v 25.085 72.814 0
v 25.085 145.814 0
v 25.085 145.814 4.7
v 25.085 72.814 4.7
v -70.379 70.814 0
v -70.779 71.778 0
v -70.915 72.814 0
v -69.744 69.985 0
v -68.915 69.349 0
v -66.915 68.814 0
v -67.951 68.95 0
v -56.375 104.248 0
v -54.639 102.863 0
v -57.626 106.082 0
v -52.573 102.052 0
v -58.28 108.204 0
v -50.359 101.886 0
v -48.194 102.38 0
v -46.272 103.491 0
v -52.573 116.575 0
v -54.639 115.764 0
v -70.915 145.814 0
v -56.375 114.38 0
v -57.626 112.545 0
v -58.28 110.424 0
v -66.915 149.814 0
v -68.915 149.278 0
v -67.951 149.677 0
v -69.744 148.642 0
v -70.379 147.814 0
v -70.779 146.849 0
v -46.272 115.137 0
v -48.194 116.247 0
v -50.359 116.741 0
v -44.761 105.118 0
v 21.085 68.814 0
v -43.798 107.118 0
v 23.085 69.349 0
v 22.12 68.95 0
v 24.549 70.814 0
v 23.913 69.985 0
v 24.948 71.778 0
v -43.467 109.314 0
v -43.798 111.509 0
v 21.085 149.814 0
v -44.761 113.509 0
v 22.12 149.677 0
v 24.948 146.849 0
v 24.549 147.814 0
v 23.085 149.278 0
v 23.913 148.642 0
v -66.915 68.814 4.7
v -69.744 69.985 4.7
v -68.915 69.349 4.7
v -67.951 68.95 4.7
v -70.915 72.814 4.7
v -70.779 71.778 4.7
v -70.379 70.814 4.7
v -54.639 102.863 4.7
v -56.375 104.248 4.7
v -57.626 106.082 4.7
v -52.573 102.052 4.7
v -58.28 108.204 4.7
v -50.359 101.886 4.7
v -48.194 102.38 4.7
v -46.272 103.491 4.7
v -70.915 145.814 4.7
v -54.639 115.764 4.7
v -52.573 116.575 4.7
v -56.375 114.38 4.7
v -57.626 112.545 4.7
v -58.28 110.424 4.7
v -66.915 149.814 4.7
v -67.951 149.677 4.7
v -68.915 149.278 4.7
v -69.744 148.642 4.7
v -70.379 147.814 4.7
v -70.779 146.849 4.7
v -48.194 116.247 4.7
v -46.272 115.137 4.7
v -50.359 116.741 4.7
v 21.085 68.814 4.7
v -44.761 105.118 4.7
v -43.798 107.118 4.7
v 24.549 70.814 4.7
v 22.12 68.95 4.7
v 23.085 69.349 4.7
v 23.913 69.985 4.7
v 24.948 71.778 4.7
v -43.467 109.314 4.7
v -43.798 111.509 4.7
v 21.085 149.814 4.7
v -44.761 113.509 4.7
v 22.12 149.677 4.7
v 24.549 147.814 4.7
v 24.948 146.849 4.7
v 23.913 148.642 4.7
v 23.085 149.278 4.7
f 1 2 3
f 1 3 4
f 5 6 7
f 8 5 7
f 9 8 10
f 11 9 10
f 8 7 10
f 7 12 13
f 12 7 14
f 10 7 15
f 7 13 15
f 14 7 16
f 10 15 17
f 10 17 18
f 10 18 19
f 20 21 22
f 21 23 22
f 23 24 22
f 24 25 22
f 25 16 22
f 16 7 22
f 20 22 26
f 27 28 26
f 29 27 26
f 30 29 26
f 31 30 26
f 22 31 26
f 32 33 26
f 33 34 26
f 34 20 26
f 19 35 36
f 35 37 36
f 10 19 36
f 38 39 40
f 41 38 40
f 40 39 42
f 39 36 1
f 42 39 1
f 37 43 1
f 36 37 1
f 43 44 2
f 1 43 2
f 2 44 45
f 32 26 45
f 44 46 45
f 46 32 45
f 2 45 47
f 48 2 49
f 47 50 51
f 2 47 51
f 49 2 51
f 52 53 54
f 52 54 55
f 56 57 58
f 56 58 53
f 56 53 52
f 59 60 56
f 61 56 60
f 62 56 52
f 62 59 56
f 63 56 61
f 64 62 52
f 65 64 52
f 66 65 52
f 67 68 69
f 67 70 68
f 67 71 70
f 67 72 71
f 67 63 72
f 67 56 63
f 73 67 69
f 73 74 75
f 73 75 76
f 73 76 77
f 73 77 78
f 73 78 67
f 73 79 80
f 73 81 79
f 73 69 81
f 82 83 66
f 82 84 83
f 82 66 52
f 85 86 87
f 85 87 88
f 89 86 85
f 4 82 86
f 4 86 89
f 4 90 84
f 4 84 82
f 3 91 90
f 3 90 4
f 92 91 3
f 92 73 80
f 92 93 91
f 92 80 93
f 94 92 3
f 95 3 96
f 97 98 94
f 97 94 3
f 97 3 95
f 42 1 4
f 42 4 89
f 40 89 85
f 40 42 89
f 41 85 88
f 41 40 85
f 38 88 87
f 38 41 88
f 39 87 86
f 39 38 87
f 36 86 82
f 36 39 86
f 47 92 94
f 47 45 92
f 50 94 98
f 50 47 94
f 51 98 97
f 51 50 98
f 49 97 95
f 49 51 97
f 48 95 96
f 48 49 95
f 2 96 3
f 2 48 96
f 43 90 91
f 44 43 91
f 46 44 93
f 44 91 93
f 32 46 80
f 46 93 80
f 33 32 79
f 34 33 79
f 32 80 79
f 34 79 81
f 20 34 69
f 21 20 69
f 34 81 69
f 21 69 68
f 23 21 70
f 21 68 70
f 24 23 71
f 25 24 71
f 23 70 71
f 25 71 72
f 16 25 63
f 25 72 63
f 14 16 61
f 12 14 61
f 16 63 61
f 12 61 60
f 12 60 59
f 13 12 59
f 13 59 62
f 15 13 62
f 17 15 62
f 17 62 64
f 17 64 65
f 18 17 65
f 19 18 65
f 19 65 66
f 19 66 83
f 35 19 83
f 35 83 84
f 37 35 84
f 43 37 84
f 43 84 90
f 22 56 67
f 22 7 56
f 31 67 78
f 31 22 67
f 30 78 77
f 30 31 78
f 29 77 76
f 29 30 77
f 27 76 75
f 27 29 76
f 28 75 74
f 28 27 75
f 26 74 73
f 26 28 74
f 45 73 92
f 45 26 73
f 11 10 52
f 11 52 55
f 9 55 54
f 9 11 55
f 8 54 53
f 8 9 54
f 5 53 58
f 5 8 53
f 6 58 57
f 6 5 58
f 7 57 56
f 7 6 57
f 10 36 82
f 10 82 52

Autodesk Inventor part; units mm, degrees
ref_plane "YZ Plane" through (0, 0, 0) normal (1, 0, 0) x (0, 1, 0)
ref_plane "XZ Plane" through (0, 0, 0) normal (0, 1, 0) x (-1, 0, 0)
ref_plane "XY Plane" through (0, 0, 0) normal (0, 0, 1) x (1, 0, 0)
sketch "Sketch1" plane through (0, 0, 0) normal (0, 0, 1) x (1, 0, 0)
  line L0 (21.0847, 68.8136) -> (-66.9153, 68.8136)
  line L1 (-70.9153, 72.8136) -> (-70.9153, 145.8136)
  line L2 (-66.9153, 149.8136) -> (21.0847, 149.8136)
  line L3 (25.0847, 145.8136) -> (25.0847, 72.8136)
  line L4 (4.925, 0) -> (4.925, 205.34) projected
  line L5 (-25.075, 0) -> (-25.075, 205.34) projected
  arc A0 (-66.9153, 149.8136) -> (-70.9153, 145.8136) centre (-66.9153, 145.8136) ccw
  arc A1 (25.0847, 145.8136) -> (21.0847, 149.8136) centre (21.0847, 145.8136) ccw
  arc A2 (21.0847, 68.8136) -> (25.0847, 72.8136) centre (21.0847, 72.8136) ccw
  arc A3 (-70.9153, 72.8136) -> (-66.9153, 68.8136) centre (-66.9153, 72.8136) ccw
  point P0 (0, 0)
  dimension "d0" = 96
  dimension "d1" = 81
  dimension "d2" = 4
extrude "Extrusion1" add sketch "Sketch1" along normal blind 4.7
sketch "Sketch2" plane through (0, 0, 4.7) normal (0, 0, 1) x (1, 0, 0)
  line L0 (21.0847, 149.8136) -> (-66.9153, 149.8136) projected
  arc A0 (-66.9153, 149.8136) -> (-70.9153, 145.8136) centre (-66.9153, 145.8136) ccw projected
  line L1 (-70.9153, 145.8136) -> (-70.9153, 72.8136) projected
  arc A1 (-70.9153, 72.8136) -> (-66.9153, 68.8136) centre (-66.9153, 72.8136) ccw projected
  line L2 (-66.9153, 68.8136) -> (21.0847, 68.8136) projected
  arc A2 (21.0847, 68.8136) -> (25.0847, 72.8136) centre (21.0847, 72.8136) ccw projected
  line L3 (25.0847, 72.8136) -> (25.0847, 145.8136) projected
  arc A3 (25.0847, 145.8136) -> (21.0847, 149.8136) centre (21.0847, 145.8136) ccw projected
  circle A4 centre (-50.9153, 109.3136) radius 7.448
  point P0 (0, 0)
  dimension "d5" = 20
extrude "Extrusion2" cut sketch "Sketch2" against normal through all contours A4
properties part number "Neje_Base_slide_x"
